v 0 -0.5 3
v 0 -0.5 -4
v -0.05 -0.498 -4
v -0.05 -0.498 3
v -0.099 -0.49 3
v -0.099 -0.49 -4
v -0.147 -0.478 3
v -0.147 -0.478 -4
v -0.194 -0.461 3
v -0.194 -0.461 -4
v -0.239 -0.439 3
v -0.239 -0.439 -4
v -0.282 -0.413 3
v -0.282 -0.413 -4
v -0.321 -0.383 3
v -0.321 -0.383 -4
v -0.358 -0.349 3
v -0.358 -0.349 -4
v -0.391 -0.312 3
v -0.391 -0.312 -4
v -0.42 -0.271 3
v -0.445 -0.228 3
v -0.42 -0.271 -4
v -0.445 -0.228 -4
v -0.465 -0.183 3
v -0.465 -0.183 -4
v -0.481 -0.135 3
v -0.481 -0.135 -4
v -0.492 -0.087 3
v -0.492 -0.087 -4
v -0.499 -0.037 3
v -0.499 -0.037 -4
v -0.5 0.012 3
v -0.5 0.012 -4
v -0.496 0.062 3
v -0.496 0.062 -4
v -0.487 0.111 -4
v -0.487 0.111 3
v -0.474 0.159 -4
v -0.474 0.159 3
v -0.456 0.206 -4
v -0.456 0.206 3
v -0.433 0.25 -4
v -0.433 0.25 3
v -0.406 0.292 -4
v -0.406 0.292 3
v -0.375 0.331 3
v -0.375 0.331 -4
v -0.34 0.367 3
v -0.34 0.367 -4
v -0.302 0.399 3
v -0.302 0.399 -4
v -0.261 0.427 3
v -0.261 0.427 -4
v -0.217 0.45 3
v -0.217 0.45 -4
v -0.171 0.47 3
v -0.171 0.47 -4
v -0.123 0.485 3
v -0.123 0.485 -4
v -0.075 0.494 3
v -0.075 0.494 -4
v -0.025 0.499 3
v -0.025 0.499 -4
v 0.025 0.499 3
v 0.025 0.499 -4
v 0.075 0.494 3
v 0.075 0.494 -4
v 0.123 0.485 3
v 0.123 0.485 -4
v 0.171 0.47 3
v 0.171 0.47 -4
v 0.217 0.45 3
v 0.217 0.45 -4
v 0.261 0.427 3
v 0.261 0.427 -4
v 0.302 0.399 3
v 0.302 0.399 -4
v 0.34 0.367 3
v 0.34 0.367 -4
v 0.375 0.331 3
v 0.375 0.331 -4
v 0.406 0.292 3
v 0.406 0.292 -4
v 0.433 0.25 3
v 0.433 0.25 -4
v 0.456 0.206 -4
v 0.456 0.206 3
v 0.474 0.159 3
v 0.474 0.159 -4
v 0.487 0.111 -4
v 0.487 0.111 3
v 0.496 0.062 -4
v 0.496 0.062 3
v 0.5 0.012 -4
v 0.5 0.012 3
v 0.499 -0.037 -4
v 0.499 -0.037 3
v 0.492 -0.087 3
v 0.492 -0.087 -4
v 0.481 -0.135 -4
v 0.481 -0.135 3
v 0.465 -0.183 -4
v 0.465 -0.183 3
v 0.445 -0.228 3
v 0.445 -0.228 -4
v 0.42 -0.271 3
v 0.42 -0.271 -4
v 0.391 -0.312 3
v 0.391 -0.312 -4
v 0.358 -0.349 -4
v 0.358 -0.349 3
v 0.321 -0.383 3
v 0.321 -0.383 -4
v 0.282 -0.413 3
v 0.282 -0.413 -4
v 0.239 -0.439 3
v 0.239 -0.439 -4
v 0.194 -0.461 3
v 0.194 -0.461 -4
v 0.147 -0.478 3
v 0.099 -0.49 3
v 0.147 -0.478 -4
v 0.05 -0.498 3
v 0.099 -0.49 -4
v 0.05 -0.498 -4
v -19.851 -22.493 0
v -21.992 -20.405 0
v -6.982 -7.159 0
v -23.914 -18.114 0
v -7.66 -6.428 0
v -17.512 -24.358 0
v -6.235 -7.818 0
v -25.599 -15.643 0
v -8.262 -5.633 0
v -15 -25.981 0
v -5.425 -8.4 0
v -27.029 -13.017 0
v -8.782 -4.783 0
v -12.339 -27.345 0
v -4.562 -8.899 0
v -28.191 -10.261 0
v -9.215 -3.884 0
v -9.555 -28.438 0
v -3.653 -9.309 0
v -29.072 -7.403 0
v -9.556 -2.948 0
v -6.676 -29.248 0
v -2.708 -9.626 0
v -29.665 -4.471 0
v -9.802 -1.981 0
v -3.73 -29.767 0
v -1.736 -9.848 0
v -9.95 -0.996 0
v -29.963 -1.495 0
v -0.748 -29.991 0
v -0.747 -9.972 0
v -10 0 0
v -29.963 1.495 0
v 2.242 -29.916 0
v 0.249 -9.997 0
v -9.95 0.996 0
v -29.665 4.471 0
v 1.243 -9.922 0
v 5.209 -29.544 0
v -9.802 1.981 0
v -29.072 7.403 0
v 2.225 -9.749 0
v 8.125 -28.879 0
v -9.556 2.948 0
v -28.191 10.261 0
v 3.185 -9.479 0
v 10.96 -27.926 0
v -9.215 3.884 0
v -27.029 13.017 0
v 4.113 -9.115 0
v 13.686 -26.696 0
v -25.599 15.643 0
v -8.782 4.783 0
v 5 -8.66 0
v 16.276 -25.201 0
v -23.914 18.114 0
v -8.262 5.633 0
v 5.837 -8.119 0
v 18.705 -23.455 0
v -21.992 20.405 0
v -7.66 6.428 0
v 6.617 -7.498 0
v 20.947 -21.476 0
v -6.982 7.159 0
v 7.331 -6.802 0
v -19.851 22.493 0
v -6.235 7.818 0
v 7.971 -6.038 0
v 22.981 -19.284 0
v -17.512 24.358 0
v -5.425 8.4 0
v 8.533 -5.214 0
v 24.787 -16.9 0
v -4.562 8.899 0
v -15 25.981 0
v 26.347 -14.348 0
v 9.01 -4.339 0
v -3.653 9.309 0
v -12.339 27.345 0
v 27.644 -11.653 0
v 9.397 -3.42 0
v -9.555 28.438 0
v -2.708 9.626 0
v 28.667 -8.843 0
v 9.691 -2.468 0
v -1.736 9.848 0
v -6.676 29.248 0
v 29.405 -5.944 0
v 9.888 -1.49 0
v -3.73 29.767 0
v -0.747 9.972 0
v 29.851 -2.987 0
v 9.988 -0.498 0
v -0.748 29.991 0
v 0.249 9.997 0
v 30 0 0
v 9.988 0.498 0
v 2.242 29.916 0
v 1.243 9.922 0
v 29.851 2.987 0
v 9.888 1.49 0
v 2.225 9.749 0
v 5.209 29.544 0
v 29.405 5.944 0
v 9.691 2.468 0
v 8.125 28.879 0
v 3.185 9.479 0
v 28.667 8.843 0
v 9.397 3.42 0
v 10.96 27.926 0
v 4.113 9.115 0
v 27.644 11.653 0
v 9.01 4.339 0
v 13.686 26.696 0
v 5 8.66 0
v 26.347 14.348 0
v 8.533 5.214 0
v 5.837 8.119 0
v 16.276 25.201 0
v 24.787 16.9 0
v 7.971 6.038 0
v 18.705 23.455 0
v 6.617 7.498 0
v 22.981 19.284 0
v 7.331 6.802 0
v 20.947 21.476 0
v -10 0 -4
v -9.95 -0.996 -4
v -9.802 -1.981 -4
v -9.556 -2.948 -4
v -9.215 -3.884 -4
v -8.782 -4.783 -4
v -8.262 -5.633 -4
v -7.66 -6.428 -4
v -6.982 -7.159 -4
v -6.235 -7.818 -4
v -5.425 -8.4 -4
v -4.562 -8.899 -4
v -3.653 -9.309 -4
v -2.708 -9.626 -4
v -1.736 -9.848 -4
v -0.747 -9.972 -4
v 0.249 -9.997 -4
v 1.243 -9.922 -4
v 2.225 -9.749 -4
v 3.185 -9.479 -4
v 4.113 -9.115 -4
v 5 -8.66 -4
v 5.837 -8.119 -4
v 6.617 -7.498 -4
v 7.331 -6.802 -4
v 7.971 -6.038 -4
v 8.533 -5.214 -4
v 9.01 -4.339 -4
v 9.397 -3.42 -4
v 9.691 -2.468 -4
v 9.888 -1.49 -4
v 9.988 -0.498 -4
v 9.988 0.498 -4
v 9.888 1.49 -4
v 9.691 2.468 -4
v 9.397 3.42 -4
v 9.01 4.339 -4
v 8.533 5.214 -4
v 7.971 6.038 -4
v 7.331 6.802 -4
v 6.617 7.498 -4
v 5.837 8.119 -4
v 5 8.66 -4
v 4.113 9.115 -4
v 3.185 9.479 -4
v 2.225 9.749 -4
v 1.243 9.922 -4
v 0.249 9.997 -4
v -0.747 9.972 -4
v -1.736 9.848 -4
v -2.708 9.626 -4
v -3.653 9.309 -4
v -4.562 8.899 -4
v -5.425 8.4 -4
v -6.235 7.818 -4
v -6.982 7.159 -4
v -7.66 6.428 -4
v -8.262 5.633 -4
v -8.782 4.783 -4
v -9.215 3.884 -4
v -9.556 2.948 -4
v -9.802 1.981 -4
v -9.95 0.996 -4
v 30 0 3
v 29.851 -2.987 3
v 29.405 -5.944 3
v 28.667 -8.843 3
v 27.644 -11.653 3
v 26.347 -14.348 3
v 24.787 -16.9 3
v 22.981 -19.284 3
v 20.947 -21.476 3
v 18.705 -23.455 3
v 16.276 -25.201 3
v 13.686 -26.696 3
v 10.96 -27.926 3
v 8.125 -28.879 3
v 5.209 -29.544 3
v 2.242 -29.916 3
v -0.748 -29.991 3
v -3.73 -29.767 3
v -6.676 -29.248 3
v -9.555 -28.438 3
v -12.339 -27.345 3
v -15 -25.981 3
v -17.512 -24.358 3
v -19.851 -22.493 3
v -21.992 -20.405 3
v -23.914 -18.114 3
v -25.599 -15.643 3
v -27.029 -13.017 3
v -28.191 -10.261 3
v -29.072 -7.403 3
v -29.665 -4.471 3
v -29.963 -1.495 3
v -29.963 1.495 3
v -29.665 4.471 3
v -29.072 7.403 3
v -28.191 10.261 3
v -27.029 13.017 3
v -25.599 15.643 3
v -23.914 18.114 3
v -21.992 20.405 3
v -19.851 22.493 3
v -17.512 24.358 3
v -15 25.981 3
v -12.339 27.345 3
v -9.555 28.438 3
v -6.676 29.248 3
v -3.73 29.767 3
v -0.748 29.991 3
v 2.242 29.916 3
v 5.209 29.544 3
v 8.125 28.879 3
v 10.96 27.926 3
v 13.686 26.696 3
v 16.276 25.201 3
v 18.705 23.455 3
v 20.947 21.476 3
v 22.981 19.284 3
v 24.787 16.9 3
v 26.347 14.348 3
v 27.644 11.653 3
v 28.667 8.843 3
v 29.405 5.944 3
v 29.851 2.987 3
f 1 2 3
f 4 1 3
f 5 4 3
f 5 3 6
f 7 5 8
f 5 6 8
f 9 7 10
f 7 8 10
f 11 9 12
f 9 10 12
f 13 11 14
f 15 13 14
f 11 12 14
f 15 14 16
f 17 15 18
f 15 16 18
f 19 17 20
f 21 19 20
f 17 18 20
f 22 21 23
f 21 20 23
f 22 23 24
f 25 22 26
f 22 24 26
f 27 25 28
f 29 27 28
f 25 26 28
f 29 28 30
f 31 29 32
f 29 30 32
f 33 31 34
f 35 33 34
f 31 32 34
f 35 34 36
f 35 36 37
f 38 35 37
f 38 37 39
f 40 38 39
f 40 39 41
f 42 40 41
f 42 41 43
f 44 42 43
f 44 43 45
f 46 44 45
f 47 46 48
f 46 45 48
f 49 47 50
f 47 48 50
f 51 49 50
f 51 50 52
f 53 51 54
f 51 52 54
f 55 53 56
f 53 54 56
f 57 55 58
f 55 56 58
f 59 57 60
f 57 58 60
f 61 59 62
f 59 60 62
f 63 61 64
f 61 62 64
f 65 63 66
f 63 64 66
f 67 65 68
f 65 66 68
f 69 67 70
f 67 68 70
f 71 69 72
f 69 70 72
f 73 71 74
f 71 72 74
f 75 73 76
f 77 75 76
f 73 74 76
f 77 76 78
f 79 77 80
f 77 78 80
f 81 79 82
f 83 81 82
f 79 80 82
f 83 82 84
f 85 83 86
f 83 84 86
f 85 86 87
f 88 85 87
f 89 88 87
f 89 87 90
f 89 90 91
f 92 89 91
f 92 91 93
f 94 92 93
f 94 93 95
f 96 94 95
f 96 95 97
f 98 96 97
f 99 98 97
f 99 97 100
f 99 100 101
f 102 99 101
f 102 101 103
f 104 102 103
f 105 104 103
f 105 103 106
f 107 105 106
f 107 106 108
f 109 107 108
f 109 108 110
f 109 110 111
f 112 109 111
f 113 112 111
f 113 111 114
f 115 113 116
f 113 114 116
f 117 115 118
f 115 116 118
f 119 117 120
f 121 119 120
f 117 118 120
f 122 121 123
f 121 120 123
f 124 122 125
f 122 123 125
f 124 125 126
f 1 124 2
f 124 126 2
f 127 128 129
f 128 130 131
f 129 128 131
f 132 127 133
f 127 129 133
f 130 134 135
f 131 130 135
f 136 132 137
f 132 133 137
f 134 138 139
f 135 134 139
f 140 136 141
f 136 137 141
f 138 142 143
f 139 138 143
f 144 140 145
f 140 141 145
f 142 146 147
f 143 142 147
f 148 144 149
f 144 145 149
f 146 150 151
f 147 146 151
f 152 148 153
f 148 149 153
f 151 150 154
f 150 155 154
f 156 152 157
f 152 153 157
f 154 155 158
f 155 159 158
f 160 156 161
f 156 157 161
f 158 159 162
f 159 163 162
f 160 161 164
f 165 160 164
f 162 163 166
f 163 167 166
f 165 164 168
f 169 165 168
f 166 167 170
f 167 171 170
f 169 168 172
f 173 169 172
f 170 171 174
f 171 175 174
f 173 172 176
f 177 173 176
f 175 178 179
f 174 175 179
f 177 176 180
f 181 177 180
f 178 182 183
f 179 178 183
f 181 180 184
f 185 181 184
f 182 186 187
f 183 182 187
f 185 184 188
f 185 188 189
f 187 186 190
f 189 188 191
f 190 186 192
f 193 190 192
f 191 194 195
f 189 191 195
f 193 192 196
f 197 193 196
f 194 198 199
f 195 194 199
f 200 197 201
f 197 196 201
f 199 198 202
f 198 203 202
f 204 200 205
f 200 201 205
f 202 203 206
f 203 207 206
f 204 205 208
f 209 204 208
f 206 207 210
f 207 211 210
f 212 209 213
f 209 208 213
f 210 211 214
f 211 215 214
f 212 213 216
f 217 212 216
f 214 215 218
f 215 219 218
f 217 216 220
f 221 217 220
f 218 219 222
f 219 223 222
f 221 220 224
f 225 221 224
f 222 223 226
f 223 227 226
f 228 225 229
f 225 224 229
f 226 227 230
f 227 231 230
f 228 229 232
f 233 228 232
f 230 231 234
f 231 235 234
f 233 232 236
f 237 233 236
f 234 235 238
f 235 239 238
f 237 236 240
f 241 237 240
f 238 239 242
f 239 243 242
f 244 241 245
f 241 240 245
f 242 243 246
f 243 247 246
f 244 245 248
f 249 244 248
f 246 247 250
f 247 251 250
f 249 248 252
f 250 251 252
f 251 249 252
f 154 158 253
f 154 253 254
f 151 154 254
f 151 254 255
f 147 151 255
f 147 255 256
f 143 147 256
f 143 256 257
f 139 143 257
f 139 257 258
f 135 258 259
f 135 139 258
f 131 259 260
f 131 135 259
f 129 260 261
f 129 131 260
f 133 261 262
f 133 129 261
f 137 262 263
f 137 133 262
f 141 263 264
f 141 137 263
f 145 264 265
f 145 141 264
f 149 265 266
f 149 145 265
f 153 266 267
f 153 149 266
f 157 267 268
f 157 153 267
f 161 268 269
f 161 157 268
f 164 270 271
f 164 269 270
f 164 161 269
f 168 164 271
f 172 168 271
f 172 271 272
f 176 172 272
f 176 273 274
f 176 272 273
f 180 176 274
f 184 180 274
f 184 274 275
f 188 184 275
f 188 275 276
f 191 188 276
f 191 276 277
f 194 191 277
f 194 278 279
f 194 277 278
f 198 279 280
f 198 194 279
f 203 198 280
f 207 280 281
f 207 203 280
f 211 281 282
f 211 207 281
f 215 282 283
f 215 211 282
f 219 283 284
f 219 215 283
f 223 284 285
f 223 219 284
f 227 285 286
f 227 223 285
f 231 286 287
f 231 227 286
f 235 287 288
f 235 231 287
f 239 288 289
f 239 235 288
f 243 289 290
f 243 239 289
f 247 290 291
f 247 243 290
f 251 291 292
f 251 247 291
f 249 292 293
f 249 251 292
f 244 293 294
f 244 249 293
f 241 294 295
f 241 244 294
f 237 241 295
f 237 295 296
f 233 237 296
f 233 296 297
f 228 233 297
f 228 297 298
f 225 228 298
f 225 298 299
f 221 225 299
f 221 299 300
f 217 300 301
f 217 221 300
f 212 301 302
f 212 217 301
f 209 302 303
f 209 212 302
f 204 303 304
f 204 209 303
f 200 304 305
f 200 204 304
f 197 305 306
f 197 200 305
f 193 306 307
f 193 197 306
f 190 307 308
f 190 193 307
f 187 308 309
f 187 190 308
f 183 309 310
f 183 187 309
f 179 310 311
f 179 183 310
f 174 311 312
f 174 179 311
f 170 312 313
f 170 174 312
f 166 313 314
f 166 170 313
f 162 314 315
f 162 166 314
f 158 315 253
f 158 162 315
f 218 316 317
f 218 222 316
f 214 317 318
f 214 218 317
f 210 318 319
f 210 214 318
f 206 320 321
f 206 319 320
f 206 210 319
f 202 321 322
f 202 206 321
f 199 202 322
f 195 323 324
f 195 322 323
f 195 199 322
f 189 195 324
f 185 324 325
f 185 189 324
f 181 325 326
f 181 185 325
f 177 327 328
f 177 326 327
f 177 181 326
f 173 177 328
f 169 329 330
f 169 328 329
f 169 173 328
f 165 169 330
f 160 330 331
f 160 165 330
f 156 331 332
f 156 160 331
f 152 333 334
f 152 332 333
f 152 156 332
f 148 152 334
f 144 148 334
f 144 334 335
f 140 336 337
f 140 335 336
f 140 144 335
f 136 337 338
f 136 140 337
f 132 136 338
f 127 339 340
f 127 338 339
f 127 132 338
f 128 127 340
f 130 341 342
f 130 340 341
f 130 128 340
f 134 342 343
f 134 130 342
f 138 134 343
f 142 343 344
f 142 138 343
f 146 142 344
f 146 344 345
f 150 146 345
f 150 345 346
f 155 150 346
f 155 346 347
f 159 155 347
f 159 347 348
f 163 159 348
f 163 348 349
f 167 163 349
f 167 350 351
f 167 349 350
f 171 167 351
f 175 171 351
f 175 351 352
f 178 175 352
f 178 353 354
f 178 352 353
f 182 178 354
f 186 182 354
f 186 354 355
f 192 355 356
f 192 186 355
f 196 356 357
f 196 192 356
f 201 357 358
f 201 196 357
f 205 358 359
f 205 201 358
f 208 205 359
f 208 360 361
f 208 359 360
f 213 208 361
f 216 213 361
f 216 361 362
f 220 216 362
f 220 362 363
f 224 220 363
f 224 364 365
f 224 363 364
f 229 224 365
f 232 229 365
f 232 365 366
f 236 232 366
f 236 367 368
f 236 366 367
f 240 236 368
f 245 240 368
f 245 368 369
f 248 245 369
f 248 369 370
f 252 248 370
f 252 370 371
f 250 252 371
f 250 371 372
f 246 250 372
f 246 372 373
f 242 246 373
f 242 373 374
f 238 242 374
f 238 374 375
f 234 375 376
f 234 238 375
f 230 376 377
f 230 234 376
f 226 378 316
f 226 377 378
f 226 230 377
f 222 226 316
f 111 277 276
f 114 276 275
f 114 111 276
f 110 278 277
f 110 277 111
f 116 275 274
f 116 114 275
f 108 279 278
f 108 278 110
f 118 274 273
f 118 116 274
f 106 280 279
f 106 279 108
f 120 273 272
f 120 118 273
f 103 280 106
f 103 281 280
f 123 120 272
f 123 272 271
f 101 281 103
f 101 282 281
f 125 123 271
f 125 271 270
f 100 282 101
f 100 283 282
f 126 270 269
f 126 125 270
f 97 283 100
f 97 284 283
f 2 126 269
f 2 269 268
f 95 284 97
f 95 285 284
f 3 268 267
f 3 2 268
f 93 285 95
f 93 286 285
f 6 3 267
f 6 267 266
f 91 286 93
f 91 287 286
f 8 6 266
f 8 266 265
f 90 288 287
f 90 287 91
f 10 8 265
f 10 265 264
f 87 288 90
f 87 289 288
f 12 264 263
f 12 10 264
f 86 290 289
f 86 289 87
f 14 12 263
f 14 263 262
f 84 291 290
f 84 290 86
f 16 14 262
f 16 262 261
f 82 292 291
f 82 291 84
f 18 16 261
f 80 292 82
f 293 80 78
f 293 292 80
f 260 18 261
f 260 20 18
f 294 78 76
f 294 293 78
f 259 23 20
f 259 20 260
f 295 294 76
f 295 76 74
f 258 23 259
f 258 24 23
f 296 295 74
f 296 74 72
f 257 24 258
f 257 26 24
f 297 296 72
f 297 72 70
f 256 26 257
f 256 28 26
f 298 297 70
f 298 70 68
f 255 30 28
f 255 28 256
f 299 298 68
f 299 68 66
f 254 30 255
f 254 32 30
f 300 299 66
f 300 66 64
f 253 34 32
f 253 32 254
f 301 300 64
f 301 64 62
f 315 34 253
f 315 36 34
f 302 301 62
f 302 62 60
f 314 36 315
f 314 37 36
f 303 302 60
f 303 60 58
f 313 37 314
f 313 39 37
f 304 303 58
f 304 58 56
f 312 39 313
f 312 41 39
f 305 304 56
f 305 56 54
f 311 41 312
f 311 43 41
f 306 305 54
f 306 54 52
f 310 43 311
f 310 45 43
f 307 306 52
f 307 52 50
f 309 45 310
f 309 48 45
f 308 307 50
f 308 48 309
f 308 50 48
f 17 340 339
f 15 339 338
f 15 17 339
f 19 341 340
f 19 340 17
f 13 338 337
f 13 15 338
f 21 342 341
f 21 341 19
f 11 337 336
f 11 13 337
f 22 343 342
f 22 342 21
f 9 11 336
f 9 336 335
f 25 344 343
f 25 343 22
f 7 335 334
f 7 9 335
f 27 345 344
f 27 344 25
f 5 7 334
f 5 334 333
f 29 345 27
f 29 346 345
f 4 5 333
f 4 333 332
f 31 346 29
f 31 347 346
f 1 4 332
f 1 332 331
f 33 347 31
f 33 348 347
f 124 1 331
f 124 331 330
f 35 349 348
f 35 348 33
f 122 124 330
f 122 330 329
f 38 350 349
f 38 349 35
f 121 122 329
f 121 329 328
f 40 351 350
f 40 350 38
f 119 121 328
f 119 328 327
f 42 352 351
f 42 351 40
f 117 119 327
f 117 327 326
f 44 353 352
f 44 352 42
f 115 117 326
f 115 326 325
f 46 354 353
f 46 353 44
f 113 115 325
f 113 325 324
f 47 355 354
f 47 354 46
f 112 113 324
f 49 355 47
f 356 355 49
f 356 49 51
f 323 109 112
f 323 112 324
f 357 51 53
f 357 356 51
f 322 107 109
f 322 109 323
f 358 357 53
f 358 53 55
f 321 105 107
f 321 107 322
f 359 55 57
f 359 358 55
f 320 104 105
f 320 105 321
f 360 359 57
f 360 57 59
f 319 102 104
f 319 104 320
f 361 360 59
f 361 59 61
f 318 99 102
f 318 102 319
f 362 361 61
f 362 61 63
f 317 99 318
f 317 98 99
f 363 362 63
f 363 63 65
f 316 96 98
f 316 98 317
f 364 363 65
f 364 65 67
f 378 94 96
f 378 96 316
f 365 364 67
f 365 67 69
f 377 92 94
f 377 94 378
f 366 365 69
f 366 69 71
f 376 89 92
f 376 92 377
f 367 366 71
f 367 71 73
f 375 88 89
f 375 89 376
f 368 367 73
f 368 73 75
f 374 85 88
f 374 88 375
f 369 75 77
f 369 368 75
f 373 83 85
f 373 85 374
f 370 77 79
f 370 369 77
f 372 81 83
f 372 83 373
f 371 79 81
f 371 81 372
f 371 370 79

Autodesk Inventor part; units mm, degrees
ref_plane "YZ Plane" through (0, 0, 0) normal (1, 0, 0) x (0, 1, 0)
ref_plane "XZ Plane" through (0, 0, 0) normal (0, 1, 0) x (-1, 0, 0)
ref_plane "XY Plane" through (0, 0, 0) normal (0, 0, 1) x (1, 0, 0)
sketch "Sketch1" plane through (0, 0, 0) normal (0, 0, 1) x (1, 0, 0)
  circle A0 centre (0, 0) radius 30
  dimension "d0" = 60
extrude "Extrusion1" add sketch "Sketch1" along normal blind 3
sketch "Sketch2" plane through (0, 0, 0) normal (0, 0, -1) x (-1, 0, 0)
  circle A0 centre (0, 0) radius 10
  dimension "d3" = 20
extrude "Extrusion2" add sketch "Sketch2" along normal blind 4
sketch "Sketch3" plane through (0, 0, 3) normal (0, 0, 1) x (1, 0, 0)
  point P0 (0, 0)
  point P1 (0, 0)
hole "Hole1" at (0, 0, 3) direction (0, 0, -1) diameter 1 end through all
equation "\"d0\" = re_diametro"
equation "\"d1\" = re_grosor"
equation "\"d3\" = re_eje_diametro"
equation "\"d4\" = re_eje_grosor"
equation "\"d6\" = ri_ancla_diametro"
equation "\"re_diametro\" = 60"
equation "\"re_grosor\" = 3"
equation "\"re_eje_diametro\" = 20"
equation "\"re_eje_grosor\" = 4"
equation "\"ri_ancla_diametro\" = 1"
properties part number "Rueda Externa"
